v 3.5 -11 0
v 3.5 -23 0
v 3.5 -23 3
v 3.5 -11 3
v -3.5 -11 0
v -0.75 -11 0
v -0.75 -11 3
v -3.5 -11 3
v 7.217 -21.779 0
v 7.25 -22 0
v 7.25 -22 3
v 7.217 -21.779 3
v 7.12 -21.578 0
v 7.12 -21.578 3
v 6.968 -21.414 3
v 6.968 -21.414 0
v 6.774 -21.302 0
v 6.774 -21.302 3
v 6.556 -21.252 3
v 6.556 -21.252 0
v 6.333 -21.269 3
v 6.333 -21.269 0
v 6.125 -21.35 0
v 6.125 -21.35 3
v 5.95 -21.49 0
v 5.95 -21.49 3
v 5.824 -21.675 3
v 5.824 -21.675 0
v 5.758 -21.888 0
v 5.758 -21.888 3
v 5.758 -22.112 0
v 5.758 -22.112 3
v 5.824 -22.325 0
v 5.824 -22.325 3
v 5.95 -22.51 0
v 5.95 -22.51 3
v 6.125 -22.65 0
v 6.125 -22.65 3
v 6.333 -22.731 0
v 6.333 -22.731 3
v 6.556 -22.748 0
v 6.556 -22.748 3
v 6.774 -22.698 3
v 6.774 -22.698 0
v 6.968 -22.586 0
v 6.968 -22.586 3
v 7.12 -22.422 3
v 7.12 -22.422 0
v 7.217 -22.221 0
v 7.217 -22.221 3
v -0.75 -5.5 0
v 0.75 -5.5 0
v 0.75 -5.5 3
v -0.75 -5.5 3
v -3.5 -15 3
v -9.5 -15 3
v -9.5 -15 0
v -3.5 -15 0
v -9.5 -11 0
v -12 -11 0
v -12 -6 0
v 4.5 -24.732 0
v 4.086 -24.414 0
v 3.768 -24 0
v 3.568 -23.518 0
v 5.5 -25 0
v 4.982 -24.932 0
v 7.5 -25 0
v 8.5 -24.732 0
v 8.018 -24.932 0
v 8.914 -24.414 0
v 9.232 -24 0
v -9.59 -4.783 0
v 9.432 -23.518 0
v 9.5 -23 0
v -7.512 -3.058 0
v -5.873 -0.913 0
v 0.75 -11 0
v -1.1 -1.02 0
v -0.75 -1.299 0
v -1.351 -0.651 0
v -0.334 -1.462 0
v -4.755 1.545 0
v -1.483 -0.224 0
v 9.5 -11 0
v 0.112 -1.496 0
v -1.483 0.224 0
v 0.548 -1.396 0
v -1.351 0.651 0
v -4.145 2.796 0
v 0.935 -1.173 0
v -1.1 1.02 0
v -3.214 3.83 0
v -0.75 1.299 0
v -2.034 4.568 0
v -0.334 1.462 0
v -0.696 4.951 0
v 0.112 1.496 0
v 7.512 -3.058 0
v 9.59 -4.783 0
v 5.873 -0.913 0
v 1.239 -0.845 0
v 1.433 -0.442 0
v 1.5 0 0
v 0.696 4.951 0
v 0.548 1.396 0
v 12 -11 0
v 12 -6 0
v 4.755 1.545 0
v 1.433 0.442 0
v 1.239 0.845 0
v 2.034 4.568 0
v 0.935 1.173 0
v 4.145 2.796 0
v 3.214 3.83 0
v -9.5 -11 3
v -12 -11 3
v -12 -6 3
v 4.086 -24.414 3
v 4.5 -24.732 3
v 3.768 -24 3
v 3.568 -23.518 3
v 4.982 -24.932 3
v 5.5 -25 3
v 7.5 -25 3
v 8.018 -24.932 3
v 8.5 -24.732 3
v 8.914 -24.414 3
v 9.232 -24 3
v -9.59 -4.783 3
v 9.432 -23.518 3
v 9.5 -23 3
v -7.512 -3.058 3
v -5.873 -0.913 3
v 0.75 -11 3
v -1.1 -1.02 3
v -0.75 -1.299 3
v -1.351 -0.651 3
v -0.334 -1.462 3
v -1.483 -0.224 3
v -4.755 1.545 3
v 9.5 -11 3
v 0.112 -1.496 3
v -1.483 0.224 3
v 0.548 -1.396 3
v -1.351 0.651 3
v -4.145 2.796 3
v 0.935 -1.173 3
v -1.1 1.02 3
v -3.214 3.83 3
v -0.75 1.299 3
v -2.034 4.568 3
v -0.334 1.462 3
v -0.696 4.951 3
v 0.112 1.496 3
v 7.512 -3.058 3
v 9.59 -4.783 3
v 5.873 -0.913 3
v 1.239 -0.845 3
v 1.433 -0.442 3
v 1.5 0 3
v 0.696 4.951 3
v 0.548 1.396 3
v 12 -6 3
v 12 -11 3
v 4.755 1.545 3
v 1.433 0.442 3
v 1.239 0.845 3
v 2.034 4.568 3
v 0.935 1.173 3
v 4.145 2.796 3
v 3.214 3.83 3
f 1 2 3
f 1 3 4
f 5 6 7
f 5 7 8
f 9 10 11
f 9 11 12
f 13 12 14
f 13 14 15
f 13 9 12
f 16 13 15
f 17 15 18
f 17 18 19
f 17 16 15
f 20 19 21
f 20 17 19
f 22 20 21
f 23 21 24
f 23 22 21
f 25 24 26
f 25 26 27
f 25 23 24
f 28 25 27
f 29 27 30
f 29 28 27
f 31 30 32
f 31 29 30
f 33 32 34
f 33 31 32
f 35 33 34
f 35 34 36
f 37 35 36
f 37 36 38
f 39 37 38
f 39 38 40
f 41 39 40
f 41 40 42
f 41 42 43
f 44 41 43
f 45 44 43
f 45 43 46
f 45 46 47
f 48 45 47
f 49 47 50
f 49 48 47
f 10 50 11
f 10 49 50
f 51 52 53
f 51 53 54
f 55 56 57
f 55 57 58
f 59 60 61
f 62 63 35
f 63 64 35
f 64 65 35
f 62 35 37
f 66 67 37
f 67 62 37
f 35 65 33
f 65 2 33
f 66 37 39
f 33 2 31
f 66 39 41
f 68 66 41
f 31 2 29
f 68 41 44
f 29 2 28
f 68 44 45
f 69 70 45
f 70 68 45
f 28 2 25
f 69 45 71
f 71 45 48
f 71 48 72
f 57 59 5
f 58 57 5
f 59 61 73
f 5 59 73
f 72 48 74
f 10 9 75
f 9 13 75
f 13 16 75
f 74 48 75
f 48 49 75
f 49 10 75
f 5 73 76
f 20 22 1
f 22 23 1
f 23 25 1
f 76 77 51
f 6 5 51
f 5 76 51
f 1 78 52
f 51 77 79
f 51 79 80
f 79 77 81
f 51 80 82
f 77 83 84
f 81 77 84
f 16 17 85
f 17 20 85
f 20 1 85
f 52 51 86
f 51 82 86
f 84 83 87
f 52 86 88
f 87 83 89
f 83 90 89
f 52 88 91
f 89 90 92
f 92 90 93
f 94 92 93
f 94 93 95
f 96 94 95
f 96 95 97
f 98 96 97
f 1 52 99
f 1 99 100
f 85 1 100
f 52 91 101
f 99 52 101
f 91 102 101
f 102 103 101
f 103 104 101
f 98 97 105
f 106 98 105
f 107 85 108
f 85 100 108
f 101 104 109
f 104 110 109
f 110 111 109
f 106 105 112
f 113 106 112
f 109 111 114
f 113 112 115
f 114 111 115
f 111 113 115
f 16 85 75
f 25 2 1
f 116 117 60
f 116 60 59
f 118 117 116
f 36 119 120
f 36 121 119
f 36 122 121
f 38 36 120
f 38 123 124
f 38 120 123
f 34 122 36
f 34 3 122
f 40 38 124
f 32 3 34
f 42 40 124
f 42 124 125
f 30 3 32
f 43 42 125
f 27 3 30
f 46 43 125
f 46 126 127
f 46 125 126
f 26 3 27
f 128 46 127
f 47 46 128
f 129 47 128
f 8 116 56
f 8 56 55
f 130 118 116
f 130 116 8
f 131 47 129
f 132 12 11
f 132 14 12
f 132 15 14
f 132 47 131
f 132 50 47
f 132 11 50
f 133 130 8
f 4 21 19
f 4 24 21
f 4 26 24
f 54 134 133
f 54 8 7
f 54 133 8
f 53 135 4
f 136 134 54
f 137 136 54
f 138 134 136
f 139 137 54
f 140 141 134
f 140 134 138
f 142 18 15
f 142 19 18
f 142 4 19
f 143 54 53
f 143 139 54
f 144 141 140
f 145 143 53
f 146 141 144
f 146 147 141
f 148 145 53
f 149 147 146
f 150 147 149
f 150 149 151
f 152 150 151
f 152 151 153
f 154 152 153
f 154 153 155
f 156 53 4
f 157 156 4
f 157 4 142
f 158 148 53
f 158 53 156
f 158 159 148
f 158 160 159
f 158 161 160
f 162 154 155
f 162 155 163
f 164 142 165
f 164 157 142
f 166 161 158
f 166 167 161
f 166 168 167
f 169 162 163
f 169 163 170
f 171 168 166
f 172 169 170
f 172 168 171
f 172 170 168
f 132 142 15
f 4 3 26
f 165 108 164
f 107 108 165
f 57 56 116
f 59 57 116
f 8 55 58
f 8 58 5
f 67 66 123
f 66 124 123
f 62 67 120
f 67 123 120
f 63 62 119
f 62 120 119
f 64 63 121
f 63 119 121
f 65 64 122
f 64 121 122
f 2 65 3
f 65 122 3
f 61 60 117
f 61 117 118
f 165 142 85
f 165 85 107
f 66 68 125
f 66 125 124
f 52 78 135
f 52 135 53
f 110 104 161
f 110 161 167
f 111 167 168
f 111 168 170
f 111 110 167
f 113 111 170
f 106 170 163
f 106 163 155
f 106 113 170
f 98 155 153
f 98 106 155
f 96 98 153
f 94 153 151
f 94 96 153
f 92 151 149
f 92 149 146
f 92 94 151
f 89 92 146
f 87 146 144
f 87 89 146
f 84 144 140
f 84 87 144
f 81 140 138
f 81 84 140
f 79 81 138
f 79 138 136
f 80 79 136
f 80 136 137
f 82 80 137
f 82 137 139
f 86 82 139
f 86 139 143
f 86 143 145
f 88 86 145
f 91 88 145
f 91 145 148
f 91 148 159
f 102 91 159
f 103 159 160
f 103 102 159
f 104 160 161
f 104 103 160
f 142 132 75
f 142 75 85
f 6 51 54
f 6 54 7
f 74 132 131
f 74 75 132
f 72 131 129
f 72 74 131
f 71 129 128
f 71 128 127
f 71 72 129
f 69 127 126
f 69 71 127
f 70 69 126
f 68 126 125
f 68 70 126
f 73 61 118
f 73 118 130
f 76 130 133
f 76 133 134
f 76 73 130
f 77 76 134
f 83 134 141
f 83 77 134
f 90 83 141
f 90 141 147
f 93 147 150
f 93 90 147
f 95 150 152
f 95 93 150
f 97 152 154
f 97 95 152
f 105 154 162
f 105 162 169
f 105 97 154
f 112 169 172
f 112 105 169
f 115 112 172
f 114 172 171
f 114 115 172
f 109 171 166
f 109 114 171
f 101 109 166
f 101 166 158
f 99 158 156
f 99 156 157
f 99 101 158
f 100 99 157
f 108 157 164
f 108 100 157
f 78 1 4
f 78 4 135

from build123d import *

# Parameters (mm, degrees)
SKETCH1_R           = 1.5
SKETCH1_R_2         = 0.75
BOSS_EXTRUDE1_DEPTH = 3
SKETCH2_W           = 2.5
SKETCH2_H           = 4
CUT_EXTRUDE1_DEPTH  = 10
SKETCH3_W           = 3.5
SKETCH3_H           = 4
BOSS_EXTRUDE2_DEPTH = 3
SKETCH4_W           = 2.5
SKETCH4_H           = 14
CUT_EXTRUDE2_DEPTH  = 10
FILLET1_R           = 2


with BuildPart() as part:
    # Sketch1 → Boss-Extrude1 (new body)
    with BuildSketch(Plane.XY):
        with BuildLine():
            Line((-0.75, -11), (-7, -11))
            Line((-7, -11), (-7, -15))
            Line((-7, -15), (-12, -15))
            Line((-12, -15), (-12, -11))
            Line((-12, -11), (-12, -6))
            ThreePointArc((-12, -6), (-7.512319363, -3.05842228), (-4.755323166, 1.544960058))
            ThreePointArc((-4.755323166, 1.544960058), (0, 5), (4.755323166, 1.544960058))
            ThreePointArc((4.755323166, 1.544960058), (7.512319363, -3.05842228), (12, -6))
            Line((12, -6), (12, -25))
            Line((12, -25), (3.5, -25))
            Line((3.5, -25), (3.5, -11))
            Line((3.5, -11), (0.75, -11))
            Line((0.75, -11), (0.75, -5.5))
            Line((0.75, -5.5), (-0.75, -5.5))
            Line((-0.75, -5.5), (-0.75, -11))
        make_face()
        Circle(SKETCH1_R, mode=Mode.SUBTRACT)
        with Locations((6.5, -22)):
            Circle(SKETCH1_R_2, mode=Mode.SUBTRACT)
    extrude(amount=BOSS_EXTRUDE1_DEPTH)

    # Sketch2 → Cut-Extrude1 (cut)
    with BuildSketch(Plane.XY.offset(3)):
        with Locations((-10.75, -13)):
            Rectangle(SKETCH2_W, SKETCH2_H)
    extrude(amount=-CUT_EXTRUDE1_DEPTH, mode=Mode.SUBTRACT)

    # Sketch3 → Boss-Extrude2 (add)
    with BuildSketch(Plane.XY.offset(3)):
        with Locations((-5.25, -13)):
            Rectangle(SKETCH3_W, SKETCH3_H)
    extrude(amount=-BOSS_EXTRUDE2_DEPTH)

    # Sketch4 → Cut-Extrude2 (cut)
    with BuildSketch(Plane.XY.offset(3)):
        with Locations((10.75, -18)):
            Rectangle(SKETCH4_W, SKETCH4_H)
    extrude(amount=-CUT_EXTRUDE2_DEPTH, mode=Mode.SUBTRACT)

    # Fillet1
    fillet1_edges = [part.edges().sort_by_distance(p)[0] for p in [
        (3.5, -25, 1.5),
        (9.5, -25, 1.5),
    ]]
    fillet(fillet1_edges, radius=FILLET1_R)


solid = part.part
